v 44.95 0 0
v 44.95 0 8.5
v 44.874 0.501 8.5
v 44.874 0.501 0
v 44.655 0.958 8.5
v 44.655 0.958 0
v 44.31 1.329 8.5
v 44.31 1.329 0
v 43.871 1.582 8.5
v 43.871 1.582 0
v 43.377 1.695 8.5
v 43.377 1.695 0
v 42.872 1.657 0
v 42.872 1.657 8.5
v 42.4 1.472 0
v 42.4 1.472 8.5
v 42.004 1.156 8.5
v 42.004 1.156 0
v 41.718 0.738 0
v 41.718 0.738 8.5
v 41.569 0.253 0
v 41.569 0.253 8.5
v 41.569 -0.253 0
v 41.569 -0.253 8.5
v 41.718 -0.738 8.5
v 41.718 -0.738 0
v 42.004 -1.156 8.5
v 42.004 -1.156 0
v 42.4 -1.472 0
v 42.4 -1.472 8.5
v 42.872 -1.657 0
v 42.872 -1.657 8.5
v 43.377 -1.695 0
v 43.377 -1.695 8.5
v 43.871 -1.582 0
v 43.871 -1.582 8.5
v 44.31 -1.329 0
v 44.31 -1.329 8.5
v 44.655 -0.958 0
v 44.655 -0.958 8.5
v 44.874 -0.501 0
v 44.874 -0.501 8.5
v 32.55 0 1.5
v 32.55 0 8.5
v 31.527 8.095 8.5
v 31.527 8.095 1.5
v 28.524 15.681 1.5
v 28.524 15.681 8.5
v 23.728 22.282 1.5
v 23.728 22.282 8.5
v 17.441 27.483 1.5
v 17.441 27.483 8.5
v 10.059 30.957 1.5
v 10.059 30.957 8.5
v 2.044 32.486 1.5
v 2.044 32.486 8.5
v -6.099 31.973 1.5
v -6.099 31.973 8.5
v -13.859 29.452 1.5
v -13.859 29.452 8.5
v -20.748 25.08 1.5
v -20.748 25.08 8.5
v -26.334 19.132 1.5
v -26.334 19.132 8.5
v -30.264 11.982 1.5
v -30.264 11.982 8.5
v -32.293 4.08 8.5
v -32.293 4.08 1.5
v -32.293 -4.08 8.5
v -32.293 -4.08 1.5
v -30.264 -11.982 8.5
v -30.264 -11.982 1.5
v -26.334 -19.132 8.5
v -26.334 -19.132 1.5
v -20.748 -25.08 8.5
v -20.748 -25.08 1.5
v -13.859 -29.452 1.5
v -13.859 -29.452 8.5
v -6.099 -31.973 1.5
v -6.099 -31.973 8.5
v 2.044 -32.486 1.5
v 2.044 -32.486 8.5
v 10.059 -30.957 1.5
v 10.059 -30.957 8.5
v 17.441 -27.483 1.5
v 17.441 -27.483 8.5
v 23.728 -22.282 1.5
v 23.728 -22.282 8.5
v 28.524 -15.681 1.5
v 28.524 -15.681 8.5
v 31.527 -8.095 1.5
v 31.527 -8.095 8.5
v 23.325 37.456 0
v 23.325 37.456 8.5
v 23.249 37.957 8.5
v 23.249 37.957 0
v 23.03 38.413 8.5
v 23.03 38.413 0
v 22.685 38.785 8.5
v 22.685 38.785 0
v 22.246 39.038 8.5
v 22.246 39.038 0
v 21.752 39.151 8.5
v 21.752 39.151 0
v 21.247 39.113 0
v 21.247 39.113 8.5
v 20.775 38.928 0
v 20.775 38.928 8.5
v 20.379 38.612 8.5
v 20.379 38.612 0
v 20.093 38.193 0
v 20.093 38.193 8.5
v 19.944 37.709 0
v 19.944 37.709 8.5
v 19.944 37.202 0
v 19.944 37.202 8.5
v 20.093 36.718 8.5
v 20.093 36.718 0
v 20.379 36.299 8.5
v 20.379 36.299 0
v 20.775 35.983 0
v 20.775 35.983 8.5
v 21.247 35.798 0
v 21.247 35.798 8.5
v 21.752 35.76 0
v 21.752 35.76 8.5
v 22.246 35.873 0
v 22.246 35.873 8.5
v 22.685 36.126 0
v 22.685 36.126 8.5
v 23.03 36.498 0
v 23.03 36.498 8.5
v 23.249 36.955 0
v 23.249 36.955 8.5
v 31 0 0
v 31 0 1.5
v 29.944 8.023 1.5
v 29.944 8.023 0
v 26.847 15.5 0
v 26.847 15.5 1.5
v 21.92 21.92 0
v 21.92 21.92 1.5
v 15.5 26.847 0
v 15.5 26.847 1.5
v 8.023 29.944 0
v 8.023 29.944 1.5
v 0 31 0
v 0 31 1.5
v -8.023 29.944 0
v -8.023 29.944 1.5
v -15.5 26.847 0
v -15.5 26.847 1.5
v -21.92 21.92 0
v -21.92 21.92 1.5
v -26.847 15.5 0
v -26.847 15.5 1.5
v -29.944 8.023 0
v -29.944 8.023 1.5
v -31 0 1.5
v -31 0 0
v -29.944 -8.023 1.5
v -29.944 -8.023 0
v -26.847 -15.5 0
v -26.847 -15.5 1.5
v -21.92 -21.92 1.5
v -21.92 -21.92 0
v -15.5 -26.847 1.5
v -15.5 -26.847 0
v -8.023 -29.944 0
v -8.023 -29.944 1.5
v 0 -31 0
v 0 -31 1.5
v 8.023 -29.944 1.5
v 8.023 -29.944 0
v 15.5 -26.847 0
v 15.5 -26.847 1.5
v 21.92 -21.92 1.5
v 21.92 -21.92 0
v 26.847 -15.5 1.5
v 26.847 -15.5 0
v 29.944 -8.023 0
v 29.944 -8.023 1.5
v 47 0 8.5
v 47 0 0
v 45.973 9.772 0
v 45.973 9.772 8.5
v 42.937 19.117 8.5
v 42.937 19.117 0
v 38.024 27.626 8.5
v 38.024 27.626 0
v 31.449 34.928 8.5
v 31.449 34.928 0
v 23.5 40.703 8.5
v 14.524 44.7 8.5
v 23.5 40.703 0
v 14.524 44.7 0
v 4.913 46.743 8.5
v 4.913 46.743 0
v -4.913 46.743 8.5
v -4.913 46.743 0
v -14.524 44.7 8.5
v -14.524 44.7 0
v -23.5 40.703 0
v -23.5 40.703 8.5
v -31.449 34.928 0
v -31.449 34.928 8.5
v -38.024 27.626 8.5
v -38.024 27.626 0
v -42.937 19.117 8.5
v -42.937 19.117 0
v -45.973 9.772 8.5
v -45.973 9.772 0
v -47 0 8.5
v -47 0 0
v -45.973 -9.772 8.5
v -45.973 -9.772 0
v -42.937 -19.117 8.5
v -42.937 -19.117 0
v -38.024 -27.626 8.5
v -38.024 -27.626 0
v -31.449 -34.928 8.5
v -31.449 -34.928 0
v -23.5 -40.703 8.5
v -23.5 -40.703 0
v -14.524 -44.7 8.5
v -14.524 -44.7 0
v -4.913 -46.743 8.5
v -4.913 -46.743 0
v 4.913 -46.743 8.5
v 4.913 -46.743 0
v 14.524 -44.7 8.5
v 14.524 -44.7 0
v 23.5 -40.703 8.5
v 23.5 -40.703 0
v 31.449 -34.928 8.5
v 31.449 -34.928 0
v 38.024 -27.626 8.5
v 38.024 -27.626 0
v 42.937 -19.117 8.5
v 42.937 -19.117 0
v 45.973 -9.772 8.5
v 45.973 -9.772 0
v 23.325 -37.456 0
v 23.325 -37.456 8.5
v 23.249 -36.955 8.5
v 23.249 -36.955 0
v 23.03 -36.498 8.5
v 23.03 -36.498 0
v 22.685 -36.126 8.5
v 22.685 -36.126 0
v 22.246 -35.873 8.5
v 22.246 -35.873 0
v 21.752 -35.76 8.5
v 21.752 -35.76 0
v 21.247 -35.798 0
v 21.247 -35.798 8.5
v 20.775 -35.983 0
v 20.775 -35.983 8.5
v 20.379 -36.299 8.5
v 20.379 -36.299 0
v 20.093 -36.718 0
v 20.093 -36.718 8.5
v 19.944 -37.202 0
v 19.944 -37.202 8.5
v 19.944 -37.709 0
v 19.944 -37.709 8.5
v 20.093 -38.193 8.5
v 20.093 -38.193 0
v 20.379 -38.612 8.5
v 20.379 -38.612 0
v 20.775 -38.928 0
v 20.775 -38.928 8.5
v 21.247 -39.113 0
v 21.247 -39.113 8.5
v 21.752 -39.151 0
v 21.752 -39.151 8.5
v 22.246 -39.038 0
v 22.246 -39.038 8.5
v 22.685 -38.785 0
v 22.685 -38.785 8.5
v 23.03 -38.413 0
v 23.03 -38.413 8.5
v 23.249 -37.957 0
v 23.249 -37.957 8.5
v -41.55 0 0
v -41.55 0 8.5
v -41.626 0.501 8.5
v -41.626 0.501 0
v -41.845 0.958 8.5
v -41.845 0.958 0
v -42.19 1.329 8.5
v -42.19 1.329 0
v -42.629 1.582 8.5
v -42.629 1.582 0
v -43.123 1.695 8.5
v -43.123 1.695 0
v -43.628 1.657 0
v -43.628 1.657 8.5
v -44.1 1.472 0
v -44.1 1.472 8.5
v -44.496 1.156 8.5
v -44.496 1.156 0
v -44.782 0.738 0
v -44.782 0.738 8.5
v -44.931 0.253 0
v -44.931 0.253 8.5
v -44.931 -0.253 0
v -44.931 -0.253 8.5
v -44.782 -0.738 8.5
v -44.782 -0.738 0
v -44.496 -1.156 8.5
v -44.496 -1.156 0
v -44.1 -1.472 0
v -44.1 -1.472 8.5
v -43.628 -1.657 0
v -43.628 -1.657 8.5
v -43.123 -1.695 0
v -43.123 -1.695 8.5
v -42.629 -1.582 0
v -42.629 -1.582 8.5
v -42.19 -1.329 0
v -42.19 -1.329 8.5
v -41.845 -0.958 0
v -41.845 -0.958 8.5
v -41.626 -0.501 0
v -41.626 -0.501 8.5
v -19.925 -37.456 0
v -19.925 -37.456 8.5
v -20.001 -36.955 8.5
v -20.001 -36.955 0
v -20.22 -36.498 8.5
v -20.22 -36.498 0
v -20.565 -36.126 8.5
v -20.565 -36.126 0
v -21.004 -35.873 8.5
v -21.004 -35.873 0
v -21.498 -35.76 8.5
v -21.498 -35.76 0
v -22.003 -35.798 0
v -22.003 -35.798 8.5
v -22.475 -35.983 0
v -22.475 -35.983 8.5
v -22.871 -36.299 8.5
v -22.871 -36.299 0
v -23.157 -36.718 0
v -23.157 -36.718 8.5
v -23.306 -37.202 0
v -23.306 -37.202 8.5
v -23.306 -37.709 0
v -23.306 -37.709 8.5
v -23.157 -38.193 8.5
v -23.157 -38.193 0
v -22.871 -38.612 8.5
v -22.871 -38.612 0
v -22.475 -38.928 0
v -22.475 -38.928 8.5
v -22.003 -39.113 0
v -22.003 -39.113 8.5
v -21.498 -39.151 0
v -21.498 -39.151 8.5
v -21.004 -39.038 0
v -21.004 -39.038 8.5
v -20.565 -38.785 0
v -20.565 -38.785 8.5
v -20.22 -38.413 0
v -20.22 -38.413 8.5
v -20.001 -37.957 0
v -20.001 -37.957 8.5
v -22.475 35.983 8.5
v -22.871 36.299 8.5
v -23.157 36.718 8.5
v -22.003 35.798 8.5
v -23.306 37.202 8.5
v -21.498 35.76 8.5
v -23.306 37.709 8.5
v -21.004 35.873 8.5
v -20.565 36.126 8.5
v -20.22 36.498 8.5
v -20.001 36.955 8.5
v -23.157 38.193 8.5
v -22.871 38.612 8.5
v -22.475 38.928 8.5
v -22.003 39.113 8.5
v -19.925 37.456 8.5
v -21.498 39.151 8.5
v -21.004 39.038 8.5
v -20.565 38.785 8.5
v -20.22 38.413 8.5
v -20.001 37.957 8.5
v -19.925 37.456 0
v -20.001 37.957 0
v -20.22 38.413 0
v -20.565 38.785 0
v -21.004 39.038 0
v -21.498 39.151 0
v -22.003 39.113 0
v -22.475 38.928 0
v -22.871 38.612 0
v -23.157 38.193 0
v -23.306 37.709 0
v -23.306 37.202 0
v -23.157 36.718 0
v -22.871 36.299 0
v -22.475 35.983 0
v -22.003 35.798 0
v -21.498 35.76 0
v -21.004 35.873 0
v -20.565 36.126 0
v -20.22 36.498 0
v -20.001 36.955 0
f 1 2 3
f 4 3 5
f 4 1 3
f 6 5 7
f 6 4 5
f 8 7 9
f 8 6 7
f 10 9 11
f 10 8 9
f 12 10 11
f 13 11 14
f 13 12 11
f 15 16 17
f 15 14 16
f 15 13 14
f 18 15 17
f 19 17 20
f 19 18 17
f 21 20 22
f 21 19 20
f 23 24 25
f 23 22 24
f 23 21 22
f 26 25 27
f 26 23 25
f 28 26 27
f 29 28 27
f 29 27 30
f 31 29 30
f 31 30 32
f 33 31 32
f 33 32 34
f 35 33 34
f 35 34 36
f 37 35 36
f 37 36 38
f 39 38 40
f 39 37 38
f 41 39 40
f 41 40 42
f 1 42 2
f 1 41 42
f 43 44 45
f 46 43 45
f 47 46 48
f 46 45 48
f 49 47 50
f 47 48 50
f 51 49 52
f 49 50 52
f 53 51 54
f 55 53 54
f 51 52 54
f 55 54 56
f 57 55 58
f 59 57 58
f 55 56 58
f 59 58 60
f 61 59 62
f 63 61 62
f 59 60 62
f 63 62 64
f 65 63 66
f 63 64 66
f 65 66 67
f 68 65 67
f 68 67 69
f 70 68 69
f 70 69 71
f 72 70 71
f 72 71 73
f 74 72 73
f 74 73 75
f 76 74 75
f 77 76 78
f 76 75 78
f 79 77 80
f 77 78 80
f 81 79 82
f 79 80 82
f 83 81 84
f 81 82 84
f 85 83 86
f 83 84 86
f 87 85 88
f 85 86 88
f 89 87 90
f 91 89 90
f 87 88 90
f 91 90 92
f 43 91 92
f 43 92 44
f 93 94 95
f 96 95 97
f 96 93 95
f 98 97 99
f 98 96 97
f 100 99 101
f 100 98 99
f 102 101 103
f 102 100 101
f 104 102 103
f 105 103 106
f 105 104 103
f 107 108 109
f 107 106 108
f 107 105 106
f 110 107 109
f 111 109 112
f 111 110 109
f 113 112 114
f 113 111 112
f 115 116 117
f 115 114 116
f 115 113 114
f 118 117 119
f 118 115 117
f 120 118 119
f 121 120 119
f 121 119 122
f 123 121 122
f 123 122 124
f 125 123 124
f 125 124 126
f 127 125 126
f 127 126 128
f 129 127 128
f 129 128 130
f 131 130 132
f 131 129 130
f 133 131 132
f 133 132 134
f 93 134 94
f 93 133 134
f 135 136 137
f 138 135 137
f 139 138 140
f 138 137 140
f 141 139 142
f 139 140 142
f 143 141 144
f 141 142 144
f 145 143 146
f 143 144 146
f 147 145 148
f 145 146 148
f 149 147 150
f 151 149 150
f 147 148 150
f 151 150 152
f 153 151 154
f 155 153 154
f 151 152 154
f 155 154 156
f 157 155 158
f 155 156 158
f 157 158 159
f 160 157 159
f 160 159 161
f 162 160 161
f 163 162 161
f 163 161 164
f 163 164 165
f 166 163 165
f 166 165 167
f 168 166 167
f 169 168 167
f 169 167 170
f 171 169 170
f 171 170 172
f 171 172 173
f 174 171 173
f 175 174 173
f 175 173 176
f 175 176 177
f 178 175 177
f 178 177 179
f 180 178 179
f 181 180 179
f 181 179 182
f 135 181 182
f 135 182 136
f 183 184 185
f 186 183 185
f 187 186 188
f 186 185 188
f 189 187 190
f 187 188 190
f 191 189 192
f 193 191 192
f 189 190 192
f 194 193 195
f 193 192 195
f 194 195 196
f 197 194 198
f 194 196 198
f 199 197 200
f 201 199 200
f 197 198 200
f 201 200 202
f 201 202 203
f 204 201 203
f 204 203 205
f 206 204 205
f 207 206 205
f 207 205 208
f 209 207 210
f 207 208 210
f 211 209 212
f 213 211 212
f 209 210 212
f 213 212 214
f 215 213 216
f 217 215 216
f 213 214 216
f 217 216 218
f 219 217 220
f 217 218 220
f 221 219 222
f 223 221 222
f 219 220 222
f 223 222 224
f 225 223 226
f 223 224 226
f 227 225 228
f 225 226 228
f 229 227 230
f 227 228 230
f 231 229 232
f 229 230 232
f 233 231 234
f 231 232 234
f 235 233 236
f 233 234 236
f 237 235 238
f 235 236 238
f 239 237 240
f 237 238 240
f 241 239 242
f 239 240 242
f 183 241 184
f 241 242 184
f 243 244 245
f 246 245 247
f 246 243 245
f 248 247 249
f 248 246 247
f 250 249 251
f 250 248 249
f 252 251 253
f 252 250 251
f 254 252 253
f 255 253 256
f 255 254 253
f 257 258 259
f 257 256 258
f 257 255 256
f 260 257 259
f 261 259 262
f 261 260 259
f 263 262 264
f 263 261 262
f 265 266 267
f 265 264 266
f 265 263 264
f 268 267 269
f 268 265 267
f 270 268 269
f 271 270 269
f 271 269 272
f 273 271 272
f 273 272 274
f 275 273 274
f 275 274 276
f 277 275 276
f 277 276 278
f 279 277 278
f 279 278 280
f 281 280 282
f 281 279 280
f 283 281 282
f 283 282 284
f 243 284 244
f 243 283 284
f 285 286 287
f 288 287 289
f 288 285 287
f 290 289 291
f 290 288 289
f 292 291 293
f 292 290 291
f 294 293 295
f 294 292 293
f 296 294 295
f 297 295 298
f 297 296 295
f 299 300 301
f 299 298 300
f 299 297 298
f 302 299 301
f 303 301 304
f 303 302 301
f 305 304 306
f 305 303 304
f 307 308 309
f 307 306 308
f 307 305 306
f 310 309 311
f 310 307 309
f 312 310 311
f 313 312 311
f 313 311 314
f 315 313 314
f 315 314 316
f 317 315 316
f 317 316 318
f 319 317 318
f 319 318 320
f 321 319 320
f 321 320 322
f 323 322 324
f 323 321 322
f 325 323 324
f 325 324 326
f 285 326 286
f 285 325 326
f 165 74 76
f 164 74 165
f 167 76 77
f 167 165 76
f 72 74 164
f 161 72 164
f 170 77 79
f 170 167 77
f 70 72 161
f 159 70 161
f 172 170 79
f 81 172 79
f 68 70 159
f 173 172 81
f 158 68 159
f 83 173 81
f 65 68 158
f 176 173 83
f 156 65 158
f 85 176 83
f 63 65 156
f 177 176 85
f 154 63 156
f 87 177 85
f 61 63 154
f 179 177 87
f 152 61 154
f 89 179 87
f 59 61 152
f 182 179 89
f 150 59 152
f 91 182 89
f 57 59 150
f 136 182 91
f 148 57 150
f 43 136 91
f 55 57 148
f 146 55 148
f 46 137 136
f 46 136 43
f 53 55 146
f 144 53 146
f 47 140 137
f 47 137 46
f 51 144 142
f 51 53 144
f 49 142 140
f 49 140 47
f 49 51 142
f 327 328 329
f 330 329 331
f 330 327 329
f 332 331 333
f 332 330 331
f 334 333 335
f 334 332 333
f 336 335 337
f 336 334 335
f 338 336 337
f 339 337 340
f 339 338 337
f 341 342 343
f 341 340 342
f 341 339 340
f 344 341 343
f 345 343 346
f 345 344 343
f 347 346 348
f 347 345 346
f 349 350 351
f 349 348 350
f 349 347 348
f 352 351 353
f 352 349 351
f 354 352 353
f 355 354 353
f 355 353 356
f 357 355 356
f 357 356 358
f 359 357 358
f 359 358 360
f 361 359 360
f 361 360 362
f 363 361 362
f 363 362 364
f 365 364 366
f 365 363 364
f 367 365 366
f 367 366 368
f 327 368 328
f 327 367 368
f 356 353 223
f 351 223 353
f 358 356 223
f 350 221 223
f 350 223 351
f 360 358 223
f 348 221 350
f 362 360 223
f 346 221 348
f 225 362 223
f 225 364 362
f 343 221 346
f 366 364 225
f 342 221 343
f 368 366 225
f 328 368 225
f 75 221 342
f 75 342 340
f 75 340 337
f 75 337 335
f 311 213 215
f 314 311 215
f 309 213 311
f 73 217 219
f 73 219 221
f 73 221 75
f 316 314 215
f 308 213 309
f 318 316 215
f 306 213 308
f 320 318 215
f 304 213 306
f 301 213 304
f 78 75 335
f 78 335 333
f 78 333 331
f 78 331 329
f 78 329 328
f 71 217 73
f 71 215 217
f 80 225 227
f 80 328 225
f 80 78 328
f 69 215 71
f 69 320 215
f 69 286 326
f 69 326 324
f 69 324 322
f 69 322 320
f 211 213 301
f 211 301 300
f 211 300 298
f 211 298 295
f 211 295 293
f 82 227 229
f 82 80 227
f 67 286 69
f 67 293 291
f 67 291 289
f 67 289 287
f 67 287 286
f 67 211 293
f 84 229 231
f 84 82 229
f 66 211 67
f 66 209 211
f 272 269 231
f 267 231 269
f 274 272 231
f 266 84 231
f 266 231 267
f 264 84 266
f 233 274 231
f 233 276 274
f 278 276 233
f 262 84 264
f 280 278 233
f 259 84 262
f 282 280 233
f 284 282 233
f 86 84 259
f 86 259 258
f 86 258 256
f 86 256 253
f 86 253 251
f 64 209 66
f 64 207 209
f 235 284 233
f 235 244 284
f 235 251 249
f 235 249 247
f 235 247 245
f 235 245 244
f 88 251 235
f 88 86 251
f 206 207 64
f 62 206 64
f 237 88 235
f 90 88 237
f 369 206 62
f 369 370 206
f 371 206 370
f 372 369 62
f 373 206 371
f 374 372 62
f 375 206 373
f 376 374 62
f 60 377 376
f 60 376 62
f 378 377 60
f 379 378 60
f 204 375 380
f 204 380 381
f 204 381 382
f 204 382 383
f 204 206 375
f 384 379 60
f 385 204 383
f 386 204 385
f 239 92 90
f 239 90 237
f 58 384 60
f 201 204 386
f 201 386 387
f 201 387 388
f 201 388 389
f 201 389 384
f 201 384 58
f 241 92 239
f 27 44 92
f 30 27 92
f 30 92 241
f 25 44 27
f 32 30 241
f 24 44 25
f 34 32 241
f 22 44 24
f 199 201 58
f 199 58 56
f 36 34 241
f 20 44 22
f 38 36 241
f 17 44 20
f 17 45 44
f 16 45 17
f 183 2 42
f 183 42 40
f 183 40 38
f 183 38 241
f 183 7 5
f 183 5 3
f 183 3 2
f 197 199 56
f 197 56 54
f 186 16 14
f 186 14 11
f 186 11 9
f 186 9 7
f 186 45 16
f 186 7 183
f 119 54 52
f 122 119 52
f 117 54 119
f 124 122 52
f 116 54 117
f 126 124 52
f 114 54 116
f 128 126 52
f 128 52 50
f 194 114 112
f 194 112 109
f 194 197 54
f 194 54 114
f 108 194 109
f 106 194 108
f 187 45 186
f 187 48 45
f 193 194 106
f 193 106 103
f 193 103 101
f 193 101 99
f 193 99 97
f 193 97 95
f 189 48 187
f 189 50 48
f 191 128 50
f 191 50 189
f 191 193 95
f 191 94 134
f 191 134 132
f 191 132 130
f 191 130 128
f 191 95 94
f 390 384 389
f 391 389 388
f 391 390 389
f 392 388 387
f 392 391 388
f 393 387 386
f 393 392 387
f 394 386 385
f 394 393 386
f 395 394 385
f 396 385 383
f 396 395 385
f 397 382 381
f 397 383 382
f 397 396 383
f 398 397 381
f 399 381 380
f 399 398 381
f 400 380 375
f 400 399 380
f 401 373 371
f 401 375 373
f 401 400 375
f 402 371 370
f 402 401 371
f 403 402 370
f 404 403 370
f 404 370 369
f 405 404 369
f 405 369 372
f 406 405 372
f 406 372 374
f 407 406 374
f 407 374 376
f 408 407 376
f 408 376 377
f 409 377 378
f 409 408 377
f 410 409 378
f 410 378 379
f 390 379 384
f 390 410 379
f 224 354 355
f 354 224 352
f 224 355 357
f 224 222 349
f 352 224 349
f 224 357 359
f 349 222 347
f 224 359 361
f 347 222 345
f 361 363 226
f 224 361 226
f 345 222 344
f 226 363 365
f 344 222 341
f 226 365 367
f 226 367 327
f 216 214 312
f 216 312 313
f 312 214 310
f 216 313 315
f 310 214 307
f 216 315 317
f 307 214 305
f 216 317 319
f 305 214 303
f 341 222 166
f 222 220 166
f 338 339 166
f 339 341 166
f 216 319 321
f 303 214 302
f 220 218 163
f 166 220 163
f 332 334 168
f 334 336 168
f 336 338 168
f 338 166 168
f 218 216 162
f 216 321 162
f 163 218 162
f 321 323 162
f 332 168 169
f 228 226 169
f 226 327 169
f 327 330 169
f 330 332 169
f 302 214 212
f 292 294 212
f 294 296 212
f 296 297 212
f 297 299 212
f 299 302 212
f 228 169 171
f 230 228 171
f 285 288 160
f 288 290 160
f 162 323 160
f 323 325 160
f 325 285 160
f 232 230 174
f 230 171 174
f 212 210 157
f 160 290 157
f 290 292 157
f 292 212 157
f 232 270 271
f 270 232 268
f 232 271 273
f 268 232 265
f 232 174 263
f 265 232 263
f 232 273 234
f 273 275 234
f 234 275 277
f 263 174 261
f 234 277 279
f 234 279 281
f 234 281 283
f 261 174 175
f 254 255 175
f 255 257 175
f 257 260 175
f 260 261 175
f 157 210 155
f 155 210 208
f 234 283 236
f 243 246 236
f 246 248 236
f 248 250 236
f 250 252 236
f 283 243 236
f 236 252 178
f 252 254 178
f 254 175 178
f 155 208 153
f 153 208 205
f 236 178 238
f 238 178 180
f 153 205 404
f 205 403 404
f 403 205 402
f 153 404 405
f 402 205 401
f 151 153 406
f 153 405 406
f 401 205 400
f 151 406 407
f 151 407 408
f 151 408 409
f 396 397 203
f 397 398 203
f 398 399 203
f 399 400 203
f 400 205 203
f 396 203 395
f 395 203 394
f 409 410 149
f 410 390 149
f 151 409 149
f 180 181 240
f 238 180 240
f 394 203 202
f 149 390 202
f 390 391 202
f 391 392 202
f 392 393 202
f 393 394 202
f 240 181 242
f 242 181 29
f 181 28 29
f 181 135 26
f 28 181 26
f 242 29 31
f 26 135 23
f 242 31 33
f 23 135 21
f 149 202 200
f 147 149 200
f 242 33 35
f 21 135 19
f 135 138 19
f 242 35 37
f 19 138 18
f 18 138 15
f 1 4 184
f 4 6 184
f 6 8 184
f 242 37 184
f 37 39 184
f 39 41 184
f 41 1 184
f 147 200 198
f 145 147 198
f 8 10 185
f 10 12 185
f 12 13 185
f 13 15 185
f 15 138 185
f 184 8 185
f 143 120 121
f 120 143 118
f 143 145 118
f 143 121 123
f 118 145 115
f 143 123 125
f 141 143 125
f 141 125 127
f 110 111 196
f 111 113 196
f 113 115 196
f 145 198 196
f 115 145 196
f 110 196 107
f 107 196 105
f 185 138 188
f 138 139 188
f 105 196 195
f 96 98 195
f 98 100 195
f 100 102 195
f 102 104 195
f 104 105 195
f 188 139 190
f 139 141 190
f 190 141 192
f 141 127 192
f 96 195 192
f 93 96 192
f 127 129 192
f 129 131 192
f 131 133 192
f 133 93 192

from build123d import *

# Parameters (mm, degrees)
SKETCH1_R           = 47
BOSS_EXTRUDE2_DEPTH = 8.5
SKETCH2_R           = 32.55
CUT_EXTRUDE1_DEPTH  = 7
SKETCH3_R           = 31
BRAIN_DEPTH         = 67.835619246
SKETCH4_R           = 1.7
SCREW_HOLES_DEPTH   = 68.009327709


with BuildPart() as part:
    # Sketch1 → Boss-Extrude2 (new body)
    with BuildSketch(Plane.XY):
        Circle(SKETCH1_R)
    extrude(amount=BOSS_EXTRUDE2_DEPTH)

    # Sketch2 → Cut-Extrude1 (cut)
    with BuildSketch(Plane.XY.offset(8.5)):
        Circle(SKETCH2_R)
    extrude(amount=-CUT_EXTRUDE1_DEPTH, mode=Mode.SUBTRACT)

    # Sketch3 → Brain (cut, through all)
    with BuildSketch(Plane.XY.offset(1.5)):
        Circle(SKETCH3_R)
    extrude(amount=-BRAIN_DEPTH, mode=Mode.SUBTRACT)

    # Sketch4 → Screw Holes (cut, through all)
    with BuildSketch(Plane.XY):
        with Locations((-43.25, 0)):
            Circle(SKETCH4_R)
        with Locations((-21.625, 37.455598714)):
            Circle(SKETCH4_R)
        with Locations((21.625, 37.455598714)):
            Circle(SKETCH4_R)
        with Locations((43.25, 0)):
            Circle(SKETCH4_R)
        with Locations((21.625, -37.455598714)):
            Circle(SKETCH4_R)
        with Locations((-21.625, -37.455598714)):
            Circle(SKETCH4_R)
    extrude(amount=SCREW_HOLES_DEPTH, mode=Mode.SUBTRACT)


solid = part.part
